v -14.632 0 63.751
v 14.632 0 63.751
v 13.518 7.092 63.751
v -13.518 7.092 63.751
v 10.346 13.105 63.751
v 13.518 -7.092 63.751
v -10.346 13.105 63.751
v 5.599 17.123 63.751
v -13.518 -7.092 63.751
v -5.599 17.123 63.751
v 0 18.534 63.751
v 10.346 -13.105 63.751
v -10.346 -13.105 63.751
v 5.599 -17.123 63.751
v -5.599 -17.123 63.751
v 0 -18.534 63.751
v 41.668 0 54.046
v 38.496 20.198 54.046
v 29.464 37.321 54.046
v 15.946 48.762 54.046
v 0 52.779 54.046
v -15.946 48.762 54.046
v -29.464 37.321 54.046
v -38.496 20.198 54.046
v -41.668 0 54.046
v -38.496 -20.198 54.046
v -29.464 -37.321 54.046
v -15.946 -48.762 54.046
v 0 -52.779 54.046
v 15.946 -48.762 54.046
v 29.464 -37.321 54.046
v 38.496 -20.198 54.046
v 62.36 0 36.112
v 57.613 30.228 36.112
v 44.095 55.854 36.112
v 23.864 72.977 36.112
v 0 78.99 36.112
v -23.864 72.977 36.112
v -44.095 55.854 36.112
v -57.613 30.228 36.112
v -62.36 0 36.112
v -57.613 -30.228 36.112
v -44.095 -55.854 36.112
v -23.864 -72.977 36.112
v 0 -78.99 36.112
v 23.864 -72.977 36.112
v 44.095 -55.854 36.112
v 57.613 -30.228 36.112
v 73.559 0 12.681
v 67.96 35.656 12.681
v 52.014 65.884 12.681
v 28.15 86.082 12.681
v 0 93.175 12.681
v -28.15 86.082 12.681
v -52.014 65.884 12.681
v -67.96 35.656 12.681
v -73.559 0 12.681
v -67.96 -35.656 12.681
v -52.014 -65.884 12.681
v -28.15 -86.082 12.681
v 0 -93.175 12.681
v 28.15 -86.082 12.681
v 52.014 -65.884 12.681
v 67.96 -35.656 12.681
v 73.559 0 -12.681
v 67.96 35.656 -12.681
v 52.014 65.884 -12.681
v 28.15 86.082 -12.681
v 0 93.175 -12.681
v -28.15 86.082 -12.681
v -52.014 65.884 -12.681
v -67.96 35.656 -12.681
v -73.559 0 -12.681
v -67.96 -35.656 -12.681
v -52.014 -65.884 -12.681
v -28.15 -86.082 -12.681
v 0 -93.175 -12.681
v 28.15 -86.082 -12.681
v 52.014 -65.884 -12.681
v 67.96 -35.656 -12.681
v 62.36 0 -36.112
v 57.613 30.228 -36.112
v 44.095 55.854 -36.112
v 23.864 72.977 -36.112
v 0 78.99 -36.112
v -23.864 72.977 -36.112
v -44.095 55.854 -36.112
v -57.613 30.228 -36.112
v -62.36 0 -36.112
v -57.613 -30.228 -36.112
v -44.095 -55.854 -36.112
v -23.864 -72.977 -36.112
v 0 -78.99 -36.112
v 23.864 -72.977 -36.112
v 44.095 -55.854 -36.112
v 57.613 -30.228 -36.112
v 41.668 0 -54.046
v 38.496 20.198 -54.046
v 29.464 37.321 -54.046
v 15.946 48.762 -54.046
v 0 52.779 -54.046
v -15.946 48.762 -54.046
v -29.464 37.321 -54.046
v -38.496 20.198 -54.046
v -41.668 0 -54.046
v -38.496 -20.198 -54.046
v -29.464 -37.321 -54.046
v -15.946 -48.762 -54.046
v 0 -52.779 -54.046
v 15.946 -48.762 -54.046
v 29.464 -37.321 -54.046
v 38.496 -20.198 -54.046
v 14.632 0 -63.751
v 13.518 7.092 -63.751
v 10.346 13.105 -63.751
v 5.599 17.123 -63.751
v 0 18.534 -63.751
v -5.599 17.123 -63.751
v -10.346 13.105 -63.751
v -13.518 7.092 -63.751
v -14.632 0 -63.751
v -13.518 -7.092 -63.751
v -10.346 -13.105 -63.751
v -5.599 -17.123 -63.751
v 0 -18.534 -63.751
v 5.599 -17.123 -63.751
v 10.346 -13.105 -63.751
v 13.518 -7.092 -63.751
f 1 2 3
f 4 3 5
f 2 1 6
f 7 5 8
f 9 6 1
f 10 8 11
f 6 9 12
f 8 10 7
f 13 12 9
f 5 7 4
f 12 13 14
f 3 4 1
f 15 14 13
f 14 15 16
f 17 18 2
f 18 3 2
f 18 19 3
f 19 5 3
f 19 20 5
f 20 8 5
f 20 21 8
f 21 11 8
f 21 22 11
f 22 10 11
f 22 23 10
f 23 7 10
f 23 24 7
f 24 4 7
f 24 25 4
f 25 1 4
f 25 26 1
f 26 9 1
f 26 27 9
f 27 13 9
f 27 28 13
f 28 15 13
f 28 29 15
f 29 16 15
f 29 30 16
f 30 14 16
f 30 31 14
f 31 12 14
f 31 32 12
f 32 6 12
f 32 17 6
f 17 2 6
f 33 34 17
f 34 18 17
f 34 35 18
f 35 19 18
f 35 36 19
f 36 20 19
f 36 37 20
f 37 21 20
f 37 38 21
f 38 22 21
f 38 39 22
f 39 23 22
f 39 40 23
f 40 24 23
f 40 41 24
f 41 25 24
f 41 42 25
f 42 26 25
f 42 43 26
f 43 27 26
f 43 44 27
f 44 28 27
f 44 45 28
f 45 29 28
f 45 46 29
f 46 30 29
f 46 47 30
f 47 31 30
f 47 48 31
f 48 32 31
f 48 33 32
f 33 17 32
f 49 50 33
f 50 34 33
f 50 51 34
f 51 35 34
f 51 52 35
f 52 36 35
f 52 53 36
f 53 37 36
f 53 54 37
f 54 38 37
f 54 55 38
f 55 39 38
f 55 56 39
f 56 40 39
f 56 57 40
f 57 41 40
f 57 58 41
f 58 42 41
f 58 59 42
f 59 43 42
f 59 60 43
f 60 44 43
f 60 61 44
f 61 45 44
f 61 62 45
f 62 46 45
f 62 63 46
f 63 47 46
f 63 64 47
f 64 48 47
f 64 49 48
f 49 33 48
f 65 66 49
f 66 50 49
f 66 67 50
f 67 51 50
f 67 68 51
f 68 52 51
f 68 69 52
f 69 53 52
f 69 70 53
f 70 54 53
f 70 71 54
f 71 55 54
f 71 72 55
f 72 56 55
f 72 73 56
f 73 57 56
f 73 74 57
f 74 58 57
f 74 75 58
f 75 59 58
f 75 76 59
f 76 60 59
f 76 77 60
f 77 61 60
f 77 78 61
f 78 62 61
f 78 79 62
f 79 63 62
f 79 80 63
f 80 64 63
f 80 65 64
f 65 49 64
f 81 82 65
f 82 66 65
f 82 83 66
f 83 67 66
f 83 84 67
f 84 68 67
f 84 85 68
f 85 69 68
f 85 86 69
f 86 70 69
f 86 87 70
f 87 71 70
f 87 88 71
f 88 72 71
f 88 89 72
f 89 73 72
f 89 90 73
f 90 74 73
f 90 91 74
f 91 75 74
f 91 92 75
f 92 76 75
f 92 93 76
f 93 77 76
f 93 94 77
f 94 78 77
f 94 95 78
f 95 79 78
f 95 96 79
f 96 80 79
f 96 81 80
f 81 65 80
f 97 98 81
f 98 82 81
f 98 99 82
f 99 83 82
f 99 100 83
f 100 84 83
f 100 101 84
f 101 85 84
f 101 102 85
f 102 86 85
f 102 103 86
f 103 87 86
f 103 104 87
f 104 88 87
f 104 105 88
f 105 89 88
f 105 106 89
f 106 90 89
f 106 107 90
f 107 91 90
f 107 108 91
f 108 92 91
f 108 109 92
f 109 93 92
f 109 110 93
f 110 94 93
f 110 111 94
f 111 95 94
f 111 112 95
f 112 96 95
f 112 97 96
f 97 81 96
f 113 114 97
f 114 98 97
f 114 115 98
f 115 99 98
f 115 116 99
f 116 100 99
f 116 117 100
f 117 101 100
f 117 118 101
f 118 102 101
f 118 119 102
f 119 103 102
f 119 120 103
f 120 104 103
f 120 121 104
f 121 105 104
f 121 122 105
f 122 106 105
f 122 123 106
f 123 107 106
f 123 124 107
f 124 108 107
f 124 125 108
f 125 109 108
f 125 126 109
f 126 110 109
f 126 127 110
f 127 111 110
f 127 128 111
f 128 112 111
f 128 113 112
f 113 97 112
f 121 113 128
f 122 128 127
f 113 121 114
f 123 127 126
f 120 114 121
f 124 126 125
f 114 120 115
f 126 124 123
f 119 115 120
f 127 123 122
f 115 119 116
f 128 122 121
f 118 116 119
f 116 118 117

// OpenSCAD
// Generated by SolidPython 1.0.1 on 2020-07-29 00:46:52


scale(v = [15, 19, 13]) {
	sphere(r = 5);
}
/***********************************************
*********      SolidPython code:      **********
************************************************
 
# import packages: SolidPython
from solid import *
from solid.utils import *
from itertools import chain, combinations, permutations


class Resize:

    def __init__(self, scad_file):
        self.scad_file = scad_file
        #self.scad_file = import_scad(scad_file)
        # cone/cylinder param:
        self.r1 = 0
        self.r2 = 0
        self.h = 0
        # rectangular prism param:
        self.w = 0
        self.l = 0
        # ellipse param:
        self.r = 0

    # import OpenScad code (file name corresponds to shape)


    # classify shape + parameters
    def assign(self, param1, param2, param3):
        if self.scad_file == 'cone.scad':
            self.r1 = param1
            self.r2 = param2
            self.h = param3
        elif self.scad_file == 'cylinder.scad':
            self.r1 = param1
            self.r2 = param2
            self.h = param3
        elif self.scad_file == 'rectangularPrism.scad':
            self.h = param1
            self.l = param2
            self.w = param3
        else:
            self.r = param1
            self.h = param2

    # resize parameters
    def iterate(self):
        x = range(3, 20, 2)
        i = 1
        if self.scad_file == 'cone.scad':
            tempList = list(permutations(x, 2))
            for temp in tempList:
                param1 = temp[0]
                param2 = temp[1]
                filepath = 'produced_scad_files/' + 'cone' + str(param1) + '_' + str(param2) + '_' + '.scad'
                scad_render_to_file(cylinder(h=param1, r1=param2, r2=0), filepath)

        elif self.scad_file == 'cylinder.scad':
            tempList = list(permutations(x, 3))
            for temp in tempList:
                param1 = temp[0]
                param2 = temp[1]
                filepath = 'produced_scad_files/' + 'cylinder' + str(param1) + '_' + str(param2) + '_' + '.scad'
                scad_render_to_file(cylinder(h=param1, r1=param2, r2=param2), filepath)

        elif self.scad_file == 'rectangularPrism.scad':
            tempList = list(permutations(x, 3))
            for temp in tempList:
                param1 = temp[0]
                param2 = temp[1]
                param3 = temp[2]
                filepath = 'produced_scad_files/' + 'rectangularPrism' + str(param1) + '_' + str(param2) + '_' + str(
                    param3) + '.scad'
                scad_render_to_file(cube(size=(param1, param2, param3)), filepath)

        elif self.scad_file == 'ellipse.scad':
            tempList = list(permutations(x, 4))
            for temp in tempList:
                param1 = temp[0]
                param2 = temp[1]
                param3 = temp[2]
                param4 = temp[3]
                filepath = 'produced_scad_files/' + 'ellipse' + str(param1) + '_' + str(param2) + '_' + str(param3) + '_' + str(param4) + '.scad'
                scad_render_to_file(scale([param1, param2, param3])(sphere(r=param4)), filepath)

    def render_to_scadfile(self):
        scad_render_to_file(scad, 'example.scad') 
 
************************************************/
